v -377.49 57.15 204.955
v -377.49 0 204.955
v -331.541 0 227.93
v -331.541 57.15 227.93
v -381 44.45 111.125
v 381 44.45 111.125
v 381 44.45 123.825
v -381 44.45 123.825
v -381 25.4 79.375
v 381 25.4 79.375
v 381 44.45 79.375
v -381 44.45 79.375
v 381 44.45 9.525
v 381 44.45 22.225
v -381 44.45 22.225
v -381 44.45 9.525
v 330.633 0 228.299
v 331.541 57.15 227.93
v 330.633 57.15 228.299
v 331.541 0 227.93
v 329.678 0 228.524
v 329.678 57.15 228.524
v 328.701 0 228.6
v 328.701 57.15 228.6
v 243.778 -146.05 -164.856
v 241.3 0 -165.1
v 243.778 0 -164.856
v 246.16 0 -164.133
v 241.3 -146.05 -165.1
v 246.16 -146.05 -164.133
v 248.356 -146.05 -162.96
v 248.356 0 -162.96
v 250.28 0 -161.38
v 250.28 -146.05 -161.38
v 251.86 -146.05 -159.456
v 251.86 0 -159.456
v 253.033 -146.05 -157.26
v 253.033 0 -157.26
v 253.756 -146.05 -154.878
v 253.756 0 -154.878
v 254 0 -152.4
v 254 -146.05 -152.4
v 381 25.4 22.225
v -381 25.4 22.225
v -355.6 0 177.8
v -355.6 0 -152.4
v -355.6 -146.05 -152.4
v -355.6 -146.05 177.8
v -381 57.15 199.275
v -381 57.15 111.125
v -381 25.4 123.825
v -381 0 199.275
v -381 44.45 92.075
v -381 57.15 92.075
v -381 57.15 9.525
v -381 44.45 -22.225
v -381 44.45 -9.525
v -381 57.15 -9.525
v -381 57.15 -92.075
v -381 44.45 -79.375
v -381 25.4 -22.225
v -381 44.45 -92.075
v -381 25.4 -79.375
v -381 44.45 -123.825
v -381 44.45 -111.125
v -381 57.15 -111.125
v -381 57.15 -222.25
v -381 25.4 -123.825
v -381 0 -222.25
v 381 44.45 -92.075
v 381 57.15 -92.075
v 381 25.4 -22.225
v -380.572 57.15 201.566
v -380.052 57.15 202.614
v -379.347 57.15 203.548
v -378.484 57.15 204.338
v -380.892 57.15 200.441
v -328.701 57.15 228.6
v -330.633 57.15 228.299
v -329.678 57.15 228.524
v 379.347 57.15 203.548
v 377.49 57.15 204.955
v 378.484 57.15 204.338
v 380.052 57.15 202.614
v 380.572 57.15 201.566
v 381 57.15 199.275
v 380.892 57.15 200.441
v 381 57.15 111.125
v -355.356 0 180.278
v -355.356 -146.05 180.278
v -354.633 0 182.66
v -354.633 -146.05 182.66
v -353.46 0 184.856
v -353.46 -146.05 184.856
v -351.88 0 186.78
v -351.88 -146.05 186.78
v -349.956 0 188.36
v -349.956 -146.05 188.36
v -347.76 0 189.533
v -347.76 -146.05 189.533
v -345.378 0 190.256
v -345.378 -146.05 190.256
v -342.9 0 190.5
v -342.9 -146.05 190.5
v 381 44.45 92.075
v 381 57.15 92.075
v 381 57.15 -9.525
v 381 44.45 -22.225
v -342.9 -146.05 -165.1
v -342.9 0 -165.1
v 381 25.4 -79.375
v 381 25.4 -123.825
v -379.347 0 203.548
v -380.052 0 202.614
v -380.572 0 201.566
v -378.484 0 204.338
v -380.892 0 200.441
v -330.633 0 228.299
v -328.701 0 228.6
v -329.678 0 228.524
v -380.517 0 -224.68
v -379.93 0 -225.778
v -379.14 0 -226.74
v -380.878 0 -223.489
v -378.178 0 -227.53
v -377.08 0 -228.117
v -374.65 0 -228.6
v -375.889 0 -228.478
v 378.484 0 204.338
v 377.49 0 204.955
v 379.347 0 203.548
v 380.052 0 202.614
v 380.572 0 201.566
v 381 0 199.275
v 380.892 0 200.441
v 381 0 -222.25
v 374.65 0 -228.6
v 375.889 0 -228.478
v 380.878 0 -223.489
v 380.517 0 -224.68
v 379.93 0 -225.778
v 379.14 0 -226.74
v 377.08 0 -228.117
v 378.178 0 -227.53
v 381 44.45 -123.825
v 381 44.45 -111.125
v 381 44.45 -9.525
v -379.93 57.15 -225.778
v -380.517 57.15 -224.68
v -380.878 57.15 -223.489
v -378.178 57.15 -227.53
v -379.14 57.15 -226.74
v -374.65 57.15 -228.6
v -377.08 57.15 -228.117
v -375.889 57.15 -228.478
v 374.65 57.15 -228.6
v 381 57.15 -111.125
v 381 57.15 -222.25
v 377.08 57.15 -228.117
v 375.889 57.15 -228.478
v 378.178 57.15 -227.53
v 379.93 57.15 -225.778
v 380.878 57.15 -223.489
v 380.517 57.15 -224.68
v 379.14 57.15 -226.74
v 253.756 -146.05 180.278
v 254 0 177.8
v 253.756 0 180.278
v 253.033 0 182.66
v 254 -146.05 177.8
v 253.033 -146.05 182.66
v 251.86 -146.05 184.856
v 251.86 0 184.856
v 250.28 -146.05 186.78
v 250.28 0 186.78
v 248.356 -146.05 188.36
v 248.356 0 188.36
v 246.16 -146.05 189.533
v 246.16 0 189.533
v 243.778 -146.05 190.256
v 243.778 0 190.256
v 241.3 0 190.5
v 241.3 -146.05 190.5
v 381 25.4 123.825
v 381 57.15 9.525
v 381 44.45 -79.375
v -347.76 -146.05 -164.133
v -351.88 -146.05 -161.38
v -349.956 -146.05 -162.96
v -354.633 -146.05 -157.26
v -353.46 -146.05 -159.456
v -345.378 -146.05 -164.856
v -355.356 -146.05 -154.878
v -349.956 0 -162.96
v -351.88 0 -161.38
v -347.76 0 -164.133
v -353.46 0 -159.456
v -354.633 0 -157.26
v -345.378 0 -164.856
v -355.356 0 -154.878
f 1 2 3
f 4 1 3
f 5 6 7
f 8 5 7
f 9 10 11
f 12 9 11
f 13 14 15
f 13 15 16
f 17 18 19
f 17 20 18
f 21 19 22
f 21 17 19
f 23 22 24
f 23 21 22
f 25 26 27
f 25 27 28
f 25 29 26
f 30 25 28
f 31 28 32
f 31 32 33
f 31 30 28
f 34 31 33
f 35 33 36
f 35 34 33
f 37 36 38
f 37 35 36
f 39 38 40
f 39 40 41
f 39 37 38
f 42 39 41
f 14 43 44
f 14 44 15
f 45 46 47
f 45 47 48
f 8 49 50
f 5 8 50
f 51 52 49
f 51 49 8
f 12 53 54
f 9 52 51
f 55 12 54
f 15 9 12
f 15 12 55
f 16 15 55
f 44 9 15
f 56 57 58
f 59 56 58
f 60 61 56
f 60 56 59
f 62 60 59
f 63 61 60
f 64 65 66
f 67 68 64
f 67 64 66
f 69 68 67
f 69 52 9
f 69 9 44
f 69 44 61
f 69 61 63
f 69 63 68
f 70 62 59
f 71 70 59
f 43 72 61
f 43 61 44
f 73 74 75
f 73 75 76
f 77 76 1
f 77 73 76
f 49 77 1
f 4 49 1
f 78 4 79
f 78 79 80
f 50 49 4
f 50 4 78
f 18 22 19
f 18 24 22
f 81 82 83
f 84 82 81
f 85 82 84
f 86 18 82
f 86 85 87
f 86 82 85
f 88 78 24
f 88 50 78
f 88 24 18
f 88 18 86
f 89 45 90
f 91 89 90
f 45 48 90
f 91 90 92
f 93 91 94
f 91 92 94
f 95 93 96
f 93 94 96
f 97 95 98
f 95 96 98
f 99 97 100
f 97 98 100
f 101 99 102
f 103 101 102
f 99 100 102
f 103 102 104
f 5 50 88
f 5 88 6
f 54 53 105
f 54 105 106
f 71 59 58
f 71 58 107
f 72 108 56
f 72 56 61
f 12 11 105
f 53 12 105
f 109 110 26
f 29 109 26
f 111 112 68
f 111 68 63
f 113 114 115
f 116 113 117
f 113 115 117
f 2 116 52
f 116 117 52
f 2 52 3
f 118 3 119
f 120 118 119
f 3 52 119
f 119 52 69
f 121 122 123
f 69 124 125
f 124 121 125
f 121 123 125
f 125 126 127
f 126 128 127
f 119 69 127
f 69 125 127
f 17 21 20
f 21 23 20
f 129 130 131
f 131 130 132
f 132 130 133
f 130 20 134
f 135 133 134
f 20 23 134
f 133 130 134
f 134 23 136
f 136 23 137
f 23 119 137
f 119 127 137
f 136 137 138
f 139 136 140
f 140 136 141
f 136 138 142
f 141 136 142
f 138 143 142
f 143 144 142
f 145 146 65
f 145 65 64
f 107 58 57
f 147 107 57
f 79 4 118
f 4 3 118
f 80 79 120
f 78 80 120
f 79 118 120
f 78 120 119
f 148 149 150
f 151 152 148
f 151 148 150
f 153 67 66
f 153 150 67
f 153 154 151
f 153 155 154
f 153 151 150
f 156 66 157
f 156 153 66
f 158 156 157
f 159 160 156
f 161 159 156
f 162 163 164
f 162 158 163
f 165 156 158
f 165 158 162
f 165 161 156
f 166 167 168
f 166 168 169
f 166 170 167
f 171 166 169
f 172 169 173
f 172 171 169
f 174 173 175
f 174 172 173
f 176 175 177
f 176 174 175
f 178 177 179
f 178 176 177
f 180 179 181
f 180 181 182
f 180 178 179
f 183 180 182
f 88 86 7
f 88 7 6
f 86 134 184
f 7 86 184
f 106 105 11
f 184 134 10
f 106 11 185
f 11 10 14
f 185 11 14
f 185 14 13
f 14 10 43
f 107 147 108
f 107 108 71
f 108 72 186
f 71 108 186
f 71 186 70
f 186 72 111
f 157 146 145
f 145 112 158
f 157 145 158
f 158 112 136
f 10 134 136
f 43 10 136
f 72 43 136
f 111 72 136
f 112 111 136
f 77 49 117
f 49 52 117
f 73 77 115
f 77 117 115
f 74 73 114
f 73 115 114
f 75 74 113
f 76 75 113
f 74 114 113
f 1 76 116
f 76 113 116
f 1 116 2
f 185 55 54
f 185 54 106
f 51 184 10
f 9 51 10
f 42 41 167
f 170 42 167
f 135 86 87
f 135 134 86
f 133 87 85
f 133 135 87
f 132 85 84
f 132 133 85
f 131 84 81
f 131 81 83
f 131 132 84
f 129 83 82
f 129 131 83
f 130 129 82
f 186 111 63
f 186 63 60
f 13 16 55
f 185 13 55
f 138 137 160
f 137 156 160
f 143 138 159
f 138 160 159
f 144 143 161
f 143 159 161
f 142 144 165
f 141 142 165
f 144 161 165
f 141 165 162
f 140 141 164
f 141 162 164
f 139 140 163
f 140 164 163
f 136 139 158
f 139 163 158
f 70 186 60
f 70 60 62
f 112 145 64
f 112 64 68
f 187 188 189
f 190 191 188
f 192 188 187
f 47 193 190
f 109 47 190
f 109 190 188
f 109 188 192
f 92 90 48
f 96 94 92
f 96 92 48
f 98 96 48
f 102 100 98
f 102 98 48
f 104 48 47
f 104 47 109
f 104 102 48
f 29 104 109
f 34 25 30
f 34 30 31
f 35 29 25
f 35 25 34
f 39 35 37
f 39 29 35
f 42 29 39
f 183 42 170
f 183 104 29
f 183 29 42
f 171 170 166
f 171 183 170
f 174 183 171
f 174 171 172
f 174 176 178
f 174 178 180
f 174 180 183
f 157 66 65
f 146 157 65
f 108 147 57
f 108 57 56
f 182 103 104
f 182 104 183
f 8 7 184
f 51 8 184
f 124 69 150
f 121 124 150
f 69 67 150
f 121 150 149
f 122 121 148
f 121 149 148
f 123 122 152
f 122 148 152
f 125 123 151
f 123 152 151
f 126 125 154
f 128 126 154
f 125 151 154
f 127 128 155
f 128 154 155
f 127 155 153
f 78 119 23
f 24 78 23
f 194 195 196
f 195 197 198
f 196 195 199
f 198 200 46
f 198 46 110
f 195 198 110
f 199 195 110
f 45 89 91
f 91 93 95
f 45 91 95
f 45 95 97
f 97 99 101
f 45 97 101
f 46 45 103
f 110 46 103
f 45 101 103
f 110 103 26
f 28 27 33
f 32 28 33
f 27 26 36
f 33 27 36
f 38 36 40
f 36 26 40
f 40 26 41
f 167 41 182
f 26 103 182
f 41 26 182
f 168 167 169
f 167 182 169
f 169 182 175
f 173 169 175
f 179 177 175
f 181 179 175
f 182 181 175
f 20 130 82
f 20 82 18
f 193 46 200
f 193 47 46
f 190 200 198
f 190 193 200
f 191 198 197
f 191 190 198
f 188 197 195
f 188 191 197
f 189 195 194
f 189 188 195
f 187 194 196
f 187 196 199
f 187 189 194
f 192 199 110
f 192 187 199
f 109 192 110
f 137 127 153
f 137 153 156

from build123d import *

# Parameters (mm, degrees)
SKETCH1_W           = 762
SKETCH1_H           = 457.2
BOSS_EXTRUDE1_DEPTH = 57.15
CUT_EXTRUDE1_DEPTH  = 448.978886221
CUT_EXTRUDE2_DEPTH  = 798.601455929
FILLET1_R           = 6.35
SKETCH4_W           = 609.6
SKETCH4_H           = 355.6
BOSS_EXTRUDE2_DEPTH = 146.05
FILLET2_R           = 12.7


with BuildPart() as part:
    # Sketch1 → Boss-Extrude1 (new body)
    with BuildSketch(Plane(origin=(0, 0, 0), x_dir=(1, 0, 0), z_dir=(0, 1, 0))):
        Rectangle(SKETCH1_W, SKETCH1_H)
    extrude(amount=BOSS_EXTRUDE1_DEPTH)

    # Sketch2 → Cut-Extrude1 (cut, through all)
    with BuildSketch(Plane(origin=(0, 57.15, 0), x_dir=(1, 0, 0), z_dir=(0, 1, 0))):
        Polygon((-381, -203.2), (-330.2, -228.6), (-381, -228.6), align=None)
        Polygon((330.2, -228.6), (381, -228.6), (381, -203.2), align=None)
    extrude(amount=-CUT_EXTRUDE1_DEPTH, mode=Mode.SUBTRACT)

    # Sketch3 → Cut-Extrude2 (cut, through all)
    with BuildSketch(Plane(origin=(381, 0, 0), x_dir=(0, 0, -1), z_dir=(1, 0, 0))):
        Polygon((-123.825, 25.4), (-79.375, 25.4), (-79.375, 44.45), (-92.075, 44.45), (-92.075, 57.15), (-111.125, 57.15), (-111.125, 44.45), (-123.825, 44.45), align=None)
        Polygon((-22.225, 25.4), (-22.225, 44.45), (-9.525, 44.45), (-9.525, 57.15), (9.525, 57.15), (9.525, 44.45), (22.225, 44.45), (22.225, 25.4), align=None)
        Polygon((79.375, 25.4), (79.375, 44.45), (92.075, 44.45), (92.075, 57.15), (111.125, 57.15), (111.125, 44.45), (123.825, 44.45), (123.825, 25.4), align=None)
    extrude(amount=-CUT_EXTRUDE2_DEPTH, mode=Mode.SUBTRACT)

    # Fillet1
    fillet1_edges = [part.edges().sort_by_distance(p)[0] for p in [
        (-381, 28.575, 203.2),
        (-330.2, 28.575, 228.6),
        (330.2, 28.575, 228.6),
        (381, 28.575, 203.2),
        (-381, 28.575, -228.6),
        (381, 28.575, -228.6),
    ]]
    fillet(fillet1_edges, radius=FILLET1_R)


with BuildPart() as body_2:
    # Sketch4 → Boss-Extrude2 (new body)
    with BuildSketch(Plane.XZ):
        with Locations((-50.8, 12.7)):
            Rectangle(SKETCH4_W, SKETCH4_H)
    extrude(amount=BOSS_EXTRUDE2_DEPTH)

    # Fillet2
    fillet2_edges = [body_2.edges().sort_by_distance(p)[0] for p in [
        (-355.6, -73.025, 190.5),
        (254, -73.025, 190.5),
        (254, -73.025, -165.1),
        (-355.6, -73.025, -165.1),
    ]]
    fillet(fillet2_edges, radius=FILLET2_R)


solid = Compound([part.part, body_2.part])
